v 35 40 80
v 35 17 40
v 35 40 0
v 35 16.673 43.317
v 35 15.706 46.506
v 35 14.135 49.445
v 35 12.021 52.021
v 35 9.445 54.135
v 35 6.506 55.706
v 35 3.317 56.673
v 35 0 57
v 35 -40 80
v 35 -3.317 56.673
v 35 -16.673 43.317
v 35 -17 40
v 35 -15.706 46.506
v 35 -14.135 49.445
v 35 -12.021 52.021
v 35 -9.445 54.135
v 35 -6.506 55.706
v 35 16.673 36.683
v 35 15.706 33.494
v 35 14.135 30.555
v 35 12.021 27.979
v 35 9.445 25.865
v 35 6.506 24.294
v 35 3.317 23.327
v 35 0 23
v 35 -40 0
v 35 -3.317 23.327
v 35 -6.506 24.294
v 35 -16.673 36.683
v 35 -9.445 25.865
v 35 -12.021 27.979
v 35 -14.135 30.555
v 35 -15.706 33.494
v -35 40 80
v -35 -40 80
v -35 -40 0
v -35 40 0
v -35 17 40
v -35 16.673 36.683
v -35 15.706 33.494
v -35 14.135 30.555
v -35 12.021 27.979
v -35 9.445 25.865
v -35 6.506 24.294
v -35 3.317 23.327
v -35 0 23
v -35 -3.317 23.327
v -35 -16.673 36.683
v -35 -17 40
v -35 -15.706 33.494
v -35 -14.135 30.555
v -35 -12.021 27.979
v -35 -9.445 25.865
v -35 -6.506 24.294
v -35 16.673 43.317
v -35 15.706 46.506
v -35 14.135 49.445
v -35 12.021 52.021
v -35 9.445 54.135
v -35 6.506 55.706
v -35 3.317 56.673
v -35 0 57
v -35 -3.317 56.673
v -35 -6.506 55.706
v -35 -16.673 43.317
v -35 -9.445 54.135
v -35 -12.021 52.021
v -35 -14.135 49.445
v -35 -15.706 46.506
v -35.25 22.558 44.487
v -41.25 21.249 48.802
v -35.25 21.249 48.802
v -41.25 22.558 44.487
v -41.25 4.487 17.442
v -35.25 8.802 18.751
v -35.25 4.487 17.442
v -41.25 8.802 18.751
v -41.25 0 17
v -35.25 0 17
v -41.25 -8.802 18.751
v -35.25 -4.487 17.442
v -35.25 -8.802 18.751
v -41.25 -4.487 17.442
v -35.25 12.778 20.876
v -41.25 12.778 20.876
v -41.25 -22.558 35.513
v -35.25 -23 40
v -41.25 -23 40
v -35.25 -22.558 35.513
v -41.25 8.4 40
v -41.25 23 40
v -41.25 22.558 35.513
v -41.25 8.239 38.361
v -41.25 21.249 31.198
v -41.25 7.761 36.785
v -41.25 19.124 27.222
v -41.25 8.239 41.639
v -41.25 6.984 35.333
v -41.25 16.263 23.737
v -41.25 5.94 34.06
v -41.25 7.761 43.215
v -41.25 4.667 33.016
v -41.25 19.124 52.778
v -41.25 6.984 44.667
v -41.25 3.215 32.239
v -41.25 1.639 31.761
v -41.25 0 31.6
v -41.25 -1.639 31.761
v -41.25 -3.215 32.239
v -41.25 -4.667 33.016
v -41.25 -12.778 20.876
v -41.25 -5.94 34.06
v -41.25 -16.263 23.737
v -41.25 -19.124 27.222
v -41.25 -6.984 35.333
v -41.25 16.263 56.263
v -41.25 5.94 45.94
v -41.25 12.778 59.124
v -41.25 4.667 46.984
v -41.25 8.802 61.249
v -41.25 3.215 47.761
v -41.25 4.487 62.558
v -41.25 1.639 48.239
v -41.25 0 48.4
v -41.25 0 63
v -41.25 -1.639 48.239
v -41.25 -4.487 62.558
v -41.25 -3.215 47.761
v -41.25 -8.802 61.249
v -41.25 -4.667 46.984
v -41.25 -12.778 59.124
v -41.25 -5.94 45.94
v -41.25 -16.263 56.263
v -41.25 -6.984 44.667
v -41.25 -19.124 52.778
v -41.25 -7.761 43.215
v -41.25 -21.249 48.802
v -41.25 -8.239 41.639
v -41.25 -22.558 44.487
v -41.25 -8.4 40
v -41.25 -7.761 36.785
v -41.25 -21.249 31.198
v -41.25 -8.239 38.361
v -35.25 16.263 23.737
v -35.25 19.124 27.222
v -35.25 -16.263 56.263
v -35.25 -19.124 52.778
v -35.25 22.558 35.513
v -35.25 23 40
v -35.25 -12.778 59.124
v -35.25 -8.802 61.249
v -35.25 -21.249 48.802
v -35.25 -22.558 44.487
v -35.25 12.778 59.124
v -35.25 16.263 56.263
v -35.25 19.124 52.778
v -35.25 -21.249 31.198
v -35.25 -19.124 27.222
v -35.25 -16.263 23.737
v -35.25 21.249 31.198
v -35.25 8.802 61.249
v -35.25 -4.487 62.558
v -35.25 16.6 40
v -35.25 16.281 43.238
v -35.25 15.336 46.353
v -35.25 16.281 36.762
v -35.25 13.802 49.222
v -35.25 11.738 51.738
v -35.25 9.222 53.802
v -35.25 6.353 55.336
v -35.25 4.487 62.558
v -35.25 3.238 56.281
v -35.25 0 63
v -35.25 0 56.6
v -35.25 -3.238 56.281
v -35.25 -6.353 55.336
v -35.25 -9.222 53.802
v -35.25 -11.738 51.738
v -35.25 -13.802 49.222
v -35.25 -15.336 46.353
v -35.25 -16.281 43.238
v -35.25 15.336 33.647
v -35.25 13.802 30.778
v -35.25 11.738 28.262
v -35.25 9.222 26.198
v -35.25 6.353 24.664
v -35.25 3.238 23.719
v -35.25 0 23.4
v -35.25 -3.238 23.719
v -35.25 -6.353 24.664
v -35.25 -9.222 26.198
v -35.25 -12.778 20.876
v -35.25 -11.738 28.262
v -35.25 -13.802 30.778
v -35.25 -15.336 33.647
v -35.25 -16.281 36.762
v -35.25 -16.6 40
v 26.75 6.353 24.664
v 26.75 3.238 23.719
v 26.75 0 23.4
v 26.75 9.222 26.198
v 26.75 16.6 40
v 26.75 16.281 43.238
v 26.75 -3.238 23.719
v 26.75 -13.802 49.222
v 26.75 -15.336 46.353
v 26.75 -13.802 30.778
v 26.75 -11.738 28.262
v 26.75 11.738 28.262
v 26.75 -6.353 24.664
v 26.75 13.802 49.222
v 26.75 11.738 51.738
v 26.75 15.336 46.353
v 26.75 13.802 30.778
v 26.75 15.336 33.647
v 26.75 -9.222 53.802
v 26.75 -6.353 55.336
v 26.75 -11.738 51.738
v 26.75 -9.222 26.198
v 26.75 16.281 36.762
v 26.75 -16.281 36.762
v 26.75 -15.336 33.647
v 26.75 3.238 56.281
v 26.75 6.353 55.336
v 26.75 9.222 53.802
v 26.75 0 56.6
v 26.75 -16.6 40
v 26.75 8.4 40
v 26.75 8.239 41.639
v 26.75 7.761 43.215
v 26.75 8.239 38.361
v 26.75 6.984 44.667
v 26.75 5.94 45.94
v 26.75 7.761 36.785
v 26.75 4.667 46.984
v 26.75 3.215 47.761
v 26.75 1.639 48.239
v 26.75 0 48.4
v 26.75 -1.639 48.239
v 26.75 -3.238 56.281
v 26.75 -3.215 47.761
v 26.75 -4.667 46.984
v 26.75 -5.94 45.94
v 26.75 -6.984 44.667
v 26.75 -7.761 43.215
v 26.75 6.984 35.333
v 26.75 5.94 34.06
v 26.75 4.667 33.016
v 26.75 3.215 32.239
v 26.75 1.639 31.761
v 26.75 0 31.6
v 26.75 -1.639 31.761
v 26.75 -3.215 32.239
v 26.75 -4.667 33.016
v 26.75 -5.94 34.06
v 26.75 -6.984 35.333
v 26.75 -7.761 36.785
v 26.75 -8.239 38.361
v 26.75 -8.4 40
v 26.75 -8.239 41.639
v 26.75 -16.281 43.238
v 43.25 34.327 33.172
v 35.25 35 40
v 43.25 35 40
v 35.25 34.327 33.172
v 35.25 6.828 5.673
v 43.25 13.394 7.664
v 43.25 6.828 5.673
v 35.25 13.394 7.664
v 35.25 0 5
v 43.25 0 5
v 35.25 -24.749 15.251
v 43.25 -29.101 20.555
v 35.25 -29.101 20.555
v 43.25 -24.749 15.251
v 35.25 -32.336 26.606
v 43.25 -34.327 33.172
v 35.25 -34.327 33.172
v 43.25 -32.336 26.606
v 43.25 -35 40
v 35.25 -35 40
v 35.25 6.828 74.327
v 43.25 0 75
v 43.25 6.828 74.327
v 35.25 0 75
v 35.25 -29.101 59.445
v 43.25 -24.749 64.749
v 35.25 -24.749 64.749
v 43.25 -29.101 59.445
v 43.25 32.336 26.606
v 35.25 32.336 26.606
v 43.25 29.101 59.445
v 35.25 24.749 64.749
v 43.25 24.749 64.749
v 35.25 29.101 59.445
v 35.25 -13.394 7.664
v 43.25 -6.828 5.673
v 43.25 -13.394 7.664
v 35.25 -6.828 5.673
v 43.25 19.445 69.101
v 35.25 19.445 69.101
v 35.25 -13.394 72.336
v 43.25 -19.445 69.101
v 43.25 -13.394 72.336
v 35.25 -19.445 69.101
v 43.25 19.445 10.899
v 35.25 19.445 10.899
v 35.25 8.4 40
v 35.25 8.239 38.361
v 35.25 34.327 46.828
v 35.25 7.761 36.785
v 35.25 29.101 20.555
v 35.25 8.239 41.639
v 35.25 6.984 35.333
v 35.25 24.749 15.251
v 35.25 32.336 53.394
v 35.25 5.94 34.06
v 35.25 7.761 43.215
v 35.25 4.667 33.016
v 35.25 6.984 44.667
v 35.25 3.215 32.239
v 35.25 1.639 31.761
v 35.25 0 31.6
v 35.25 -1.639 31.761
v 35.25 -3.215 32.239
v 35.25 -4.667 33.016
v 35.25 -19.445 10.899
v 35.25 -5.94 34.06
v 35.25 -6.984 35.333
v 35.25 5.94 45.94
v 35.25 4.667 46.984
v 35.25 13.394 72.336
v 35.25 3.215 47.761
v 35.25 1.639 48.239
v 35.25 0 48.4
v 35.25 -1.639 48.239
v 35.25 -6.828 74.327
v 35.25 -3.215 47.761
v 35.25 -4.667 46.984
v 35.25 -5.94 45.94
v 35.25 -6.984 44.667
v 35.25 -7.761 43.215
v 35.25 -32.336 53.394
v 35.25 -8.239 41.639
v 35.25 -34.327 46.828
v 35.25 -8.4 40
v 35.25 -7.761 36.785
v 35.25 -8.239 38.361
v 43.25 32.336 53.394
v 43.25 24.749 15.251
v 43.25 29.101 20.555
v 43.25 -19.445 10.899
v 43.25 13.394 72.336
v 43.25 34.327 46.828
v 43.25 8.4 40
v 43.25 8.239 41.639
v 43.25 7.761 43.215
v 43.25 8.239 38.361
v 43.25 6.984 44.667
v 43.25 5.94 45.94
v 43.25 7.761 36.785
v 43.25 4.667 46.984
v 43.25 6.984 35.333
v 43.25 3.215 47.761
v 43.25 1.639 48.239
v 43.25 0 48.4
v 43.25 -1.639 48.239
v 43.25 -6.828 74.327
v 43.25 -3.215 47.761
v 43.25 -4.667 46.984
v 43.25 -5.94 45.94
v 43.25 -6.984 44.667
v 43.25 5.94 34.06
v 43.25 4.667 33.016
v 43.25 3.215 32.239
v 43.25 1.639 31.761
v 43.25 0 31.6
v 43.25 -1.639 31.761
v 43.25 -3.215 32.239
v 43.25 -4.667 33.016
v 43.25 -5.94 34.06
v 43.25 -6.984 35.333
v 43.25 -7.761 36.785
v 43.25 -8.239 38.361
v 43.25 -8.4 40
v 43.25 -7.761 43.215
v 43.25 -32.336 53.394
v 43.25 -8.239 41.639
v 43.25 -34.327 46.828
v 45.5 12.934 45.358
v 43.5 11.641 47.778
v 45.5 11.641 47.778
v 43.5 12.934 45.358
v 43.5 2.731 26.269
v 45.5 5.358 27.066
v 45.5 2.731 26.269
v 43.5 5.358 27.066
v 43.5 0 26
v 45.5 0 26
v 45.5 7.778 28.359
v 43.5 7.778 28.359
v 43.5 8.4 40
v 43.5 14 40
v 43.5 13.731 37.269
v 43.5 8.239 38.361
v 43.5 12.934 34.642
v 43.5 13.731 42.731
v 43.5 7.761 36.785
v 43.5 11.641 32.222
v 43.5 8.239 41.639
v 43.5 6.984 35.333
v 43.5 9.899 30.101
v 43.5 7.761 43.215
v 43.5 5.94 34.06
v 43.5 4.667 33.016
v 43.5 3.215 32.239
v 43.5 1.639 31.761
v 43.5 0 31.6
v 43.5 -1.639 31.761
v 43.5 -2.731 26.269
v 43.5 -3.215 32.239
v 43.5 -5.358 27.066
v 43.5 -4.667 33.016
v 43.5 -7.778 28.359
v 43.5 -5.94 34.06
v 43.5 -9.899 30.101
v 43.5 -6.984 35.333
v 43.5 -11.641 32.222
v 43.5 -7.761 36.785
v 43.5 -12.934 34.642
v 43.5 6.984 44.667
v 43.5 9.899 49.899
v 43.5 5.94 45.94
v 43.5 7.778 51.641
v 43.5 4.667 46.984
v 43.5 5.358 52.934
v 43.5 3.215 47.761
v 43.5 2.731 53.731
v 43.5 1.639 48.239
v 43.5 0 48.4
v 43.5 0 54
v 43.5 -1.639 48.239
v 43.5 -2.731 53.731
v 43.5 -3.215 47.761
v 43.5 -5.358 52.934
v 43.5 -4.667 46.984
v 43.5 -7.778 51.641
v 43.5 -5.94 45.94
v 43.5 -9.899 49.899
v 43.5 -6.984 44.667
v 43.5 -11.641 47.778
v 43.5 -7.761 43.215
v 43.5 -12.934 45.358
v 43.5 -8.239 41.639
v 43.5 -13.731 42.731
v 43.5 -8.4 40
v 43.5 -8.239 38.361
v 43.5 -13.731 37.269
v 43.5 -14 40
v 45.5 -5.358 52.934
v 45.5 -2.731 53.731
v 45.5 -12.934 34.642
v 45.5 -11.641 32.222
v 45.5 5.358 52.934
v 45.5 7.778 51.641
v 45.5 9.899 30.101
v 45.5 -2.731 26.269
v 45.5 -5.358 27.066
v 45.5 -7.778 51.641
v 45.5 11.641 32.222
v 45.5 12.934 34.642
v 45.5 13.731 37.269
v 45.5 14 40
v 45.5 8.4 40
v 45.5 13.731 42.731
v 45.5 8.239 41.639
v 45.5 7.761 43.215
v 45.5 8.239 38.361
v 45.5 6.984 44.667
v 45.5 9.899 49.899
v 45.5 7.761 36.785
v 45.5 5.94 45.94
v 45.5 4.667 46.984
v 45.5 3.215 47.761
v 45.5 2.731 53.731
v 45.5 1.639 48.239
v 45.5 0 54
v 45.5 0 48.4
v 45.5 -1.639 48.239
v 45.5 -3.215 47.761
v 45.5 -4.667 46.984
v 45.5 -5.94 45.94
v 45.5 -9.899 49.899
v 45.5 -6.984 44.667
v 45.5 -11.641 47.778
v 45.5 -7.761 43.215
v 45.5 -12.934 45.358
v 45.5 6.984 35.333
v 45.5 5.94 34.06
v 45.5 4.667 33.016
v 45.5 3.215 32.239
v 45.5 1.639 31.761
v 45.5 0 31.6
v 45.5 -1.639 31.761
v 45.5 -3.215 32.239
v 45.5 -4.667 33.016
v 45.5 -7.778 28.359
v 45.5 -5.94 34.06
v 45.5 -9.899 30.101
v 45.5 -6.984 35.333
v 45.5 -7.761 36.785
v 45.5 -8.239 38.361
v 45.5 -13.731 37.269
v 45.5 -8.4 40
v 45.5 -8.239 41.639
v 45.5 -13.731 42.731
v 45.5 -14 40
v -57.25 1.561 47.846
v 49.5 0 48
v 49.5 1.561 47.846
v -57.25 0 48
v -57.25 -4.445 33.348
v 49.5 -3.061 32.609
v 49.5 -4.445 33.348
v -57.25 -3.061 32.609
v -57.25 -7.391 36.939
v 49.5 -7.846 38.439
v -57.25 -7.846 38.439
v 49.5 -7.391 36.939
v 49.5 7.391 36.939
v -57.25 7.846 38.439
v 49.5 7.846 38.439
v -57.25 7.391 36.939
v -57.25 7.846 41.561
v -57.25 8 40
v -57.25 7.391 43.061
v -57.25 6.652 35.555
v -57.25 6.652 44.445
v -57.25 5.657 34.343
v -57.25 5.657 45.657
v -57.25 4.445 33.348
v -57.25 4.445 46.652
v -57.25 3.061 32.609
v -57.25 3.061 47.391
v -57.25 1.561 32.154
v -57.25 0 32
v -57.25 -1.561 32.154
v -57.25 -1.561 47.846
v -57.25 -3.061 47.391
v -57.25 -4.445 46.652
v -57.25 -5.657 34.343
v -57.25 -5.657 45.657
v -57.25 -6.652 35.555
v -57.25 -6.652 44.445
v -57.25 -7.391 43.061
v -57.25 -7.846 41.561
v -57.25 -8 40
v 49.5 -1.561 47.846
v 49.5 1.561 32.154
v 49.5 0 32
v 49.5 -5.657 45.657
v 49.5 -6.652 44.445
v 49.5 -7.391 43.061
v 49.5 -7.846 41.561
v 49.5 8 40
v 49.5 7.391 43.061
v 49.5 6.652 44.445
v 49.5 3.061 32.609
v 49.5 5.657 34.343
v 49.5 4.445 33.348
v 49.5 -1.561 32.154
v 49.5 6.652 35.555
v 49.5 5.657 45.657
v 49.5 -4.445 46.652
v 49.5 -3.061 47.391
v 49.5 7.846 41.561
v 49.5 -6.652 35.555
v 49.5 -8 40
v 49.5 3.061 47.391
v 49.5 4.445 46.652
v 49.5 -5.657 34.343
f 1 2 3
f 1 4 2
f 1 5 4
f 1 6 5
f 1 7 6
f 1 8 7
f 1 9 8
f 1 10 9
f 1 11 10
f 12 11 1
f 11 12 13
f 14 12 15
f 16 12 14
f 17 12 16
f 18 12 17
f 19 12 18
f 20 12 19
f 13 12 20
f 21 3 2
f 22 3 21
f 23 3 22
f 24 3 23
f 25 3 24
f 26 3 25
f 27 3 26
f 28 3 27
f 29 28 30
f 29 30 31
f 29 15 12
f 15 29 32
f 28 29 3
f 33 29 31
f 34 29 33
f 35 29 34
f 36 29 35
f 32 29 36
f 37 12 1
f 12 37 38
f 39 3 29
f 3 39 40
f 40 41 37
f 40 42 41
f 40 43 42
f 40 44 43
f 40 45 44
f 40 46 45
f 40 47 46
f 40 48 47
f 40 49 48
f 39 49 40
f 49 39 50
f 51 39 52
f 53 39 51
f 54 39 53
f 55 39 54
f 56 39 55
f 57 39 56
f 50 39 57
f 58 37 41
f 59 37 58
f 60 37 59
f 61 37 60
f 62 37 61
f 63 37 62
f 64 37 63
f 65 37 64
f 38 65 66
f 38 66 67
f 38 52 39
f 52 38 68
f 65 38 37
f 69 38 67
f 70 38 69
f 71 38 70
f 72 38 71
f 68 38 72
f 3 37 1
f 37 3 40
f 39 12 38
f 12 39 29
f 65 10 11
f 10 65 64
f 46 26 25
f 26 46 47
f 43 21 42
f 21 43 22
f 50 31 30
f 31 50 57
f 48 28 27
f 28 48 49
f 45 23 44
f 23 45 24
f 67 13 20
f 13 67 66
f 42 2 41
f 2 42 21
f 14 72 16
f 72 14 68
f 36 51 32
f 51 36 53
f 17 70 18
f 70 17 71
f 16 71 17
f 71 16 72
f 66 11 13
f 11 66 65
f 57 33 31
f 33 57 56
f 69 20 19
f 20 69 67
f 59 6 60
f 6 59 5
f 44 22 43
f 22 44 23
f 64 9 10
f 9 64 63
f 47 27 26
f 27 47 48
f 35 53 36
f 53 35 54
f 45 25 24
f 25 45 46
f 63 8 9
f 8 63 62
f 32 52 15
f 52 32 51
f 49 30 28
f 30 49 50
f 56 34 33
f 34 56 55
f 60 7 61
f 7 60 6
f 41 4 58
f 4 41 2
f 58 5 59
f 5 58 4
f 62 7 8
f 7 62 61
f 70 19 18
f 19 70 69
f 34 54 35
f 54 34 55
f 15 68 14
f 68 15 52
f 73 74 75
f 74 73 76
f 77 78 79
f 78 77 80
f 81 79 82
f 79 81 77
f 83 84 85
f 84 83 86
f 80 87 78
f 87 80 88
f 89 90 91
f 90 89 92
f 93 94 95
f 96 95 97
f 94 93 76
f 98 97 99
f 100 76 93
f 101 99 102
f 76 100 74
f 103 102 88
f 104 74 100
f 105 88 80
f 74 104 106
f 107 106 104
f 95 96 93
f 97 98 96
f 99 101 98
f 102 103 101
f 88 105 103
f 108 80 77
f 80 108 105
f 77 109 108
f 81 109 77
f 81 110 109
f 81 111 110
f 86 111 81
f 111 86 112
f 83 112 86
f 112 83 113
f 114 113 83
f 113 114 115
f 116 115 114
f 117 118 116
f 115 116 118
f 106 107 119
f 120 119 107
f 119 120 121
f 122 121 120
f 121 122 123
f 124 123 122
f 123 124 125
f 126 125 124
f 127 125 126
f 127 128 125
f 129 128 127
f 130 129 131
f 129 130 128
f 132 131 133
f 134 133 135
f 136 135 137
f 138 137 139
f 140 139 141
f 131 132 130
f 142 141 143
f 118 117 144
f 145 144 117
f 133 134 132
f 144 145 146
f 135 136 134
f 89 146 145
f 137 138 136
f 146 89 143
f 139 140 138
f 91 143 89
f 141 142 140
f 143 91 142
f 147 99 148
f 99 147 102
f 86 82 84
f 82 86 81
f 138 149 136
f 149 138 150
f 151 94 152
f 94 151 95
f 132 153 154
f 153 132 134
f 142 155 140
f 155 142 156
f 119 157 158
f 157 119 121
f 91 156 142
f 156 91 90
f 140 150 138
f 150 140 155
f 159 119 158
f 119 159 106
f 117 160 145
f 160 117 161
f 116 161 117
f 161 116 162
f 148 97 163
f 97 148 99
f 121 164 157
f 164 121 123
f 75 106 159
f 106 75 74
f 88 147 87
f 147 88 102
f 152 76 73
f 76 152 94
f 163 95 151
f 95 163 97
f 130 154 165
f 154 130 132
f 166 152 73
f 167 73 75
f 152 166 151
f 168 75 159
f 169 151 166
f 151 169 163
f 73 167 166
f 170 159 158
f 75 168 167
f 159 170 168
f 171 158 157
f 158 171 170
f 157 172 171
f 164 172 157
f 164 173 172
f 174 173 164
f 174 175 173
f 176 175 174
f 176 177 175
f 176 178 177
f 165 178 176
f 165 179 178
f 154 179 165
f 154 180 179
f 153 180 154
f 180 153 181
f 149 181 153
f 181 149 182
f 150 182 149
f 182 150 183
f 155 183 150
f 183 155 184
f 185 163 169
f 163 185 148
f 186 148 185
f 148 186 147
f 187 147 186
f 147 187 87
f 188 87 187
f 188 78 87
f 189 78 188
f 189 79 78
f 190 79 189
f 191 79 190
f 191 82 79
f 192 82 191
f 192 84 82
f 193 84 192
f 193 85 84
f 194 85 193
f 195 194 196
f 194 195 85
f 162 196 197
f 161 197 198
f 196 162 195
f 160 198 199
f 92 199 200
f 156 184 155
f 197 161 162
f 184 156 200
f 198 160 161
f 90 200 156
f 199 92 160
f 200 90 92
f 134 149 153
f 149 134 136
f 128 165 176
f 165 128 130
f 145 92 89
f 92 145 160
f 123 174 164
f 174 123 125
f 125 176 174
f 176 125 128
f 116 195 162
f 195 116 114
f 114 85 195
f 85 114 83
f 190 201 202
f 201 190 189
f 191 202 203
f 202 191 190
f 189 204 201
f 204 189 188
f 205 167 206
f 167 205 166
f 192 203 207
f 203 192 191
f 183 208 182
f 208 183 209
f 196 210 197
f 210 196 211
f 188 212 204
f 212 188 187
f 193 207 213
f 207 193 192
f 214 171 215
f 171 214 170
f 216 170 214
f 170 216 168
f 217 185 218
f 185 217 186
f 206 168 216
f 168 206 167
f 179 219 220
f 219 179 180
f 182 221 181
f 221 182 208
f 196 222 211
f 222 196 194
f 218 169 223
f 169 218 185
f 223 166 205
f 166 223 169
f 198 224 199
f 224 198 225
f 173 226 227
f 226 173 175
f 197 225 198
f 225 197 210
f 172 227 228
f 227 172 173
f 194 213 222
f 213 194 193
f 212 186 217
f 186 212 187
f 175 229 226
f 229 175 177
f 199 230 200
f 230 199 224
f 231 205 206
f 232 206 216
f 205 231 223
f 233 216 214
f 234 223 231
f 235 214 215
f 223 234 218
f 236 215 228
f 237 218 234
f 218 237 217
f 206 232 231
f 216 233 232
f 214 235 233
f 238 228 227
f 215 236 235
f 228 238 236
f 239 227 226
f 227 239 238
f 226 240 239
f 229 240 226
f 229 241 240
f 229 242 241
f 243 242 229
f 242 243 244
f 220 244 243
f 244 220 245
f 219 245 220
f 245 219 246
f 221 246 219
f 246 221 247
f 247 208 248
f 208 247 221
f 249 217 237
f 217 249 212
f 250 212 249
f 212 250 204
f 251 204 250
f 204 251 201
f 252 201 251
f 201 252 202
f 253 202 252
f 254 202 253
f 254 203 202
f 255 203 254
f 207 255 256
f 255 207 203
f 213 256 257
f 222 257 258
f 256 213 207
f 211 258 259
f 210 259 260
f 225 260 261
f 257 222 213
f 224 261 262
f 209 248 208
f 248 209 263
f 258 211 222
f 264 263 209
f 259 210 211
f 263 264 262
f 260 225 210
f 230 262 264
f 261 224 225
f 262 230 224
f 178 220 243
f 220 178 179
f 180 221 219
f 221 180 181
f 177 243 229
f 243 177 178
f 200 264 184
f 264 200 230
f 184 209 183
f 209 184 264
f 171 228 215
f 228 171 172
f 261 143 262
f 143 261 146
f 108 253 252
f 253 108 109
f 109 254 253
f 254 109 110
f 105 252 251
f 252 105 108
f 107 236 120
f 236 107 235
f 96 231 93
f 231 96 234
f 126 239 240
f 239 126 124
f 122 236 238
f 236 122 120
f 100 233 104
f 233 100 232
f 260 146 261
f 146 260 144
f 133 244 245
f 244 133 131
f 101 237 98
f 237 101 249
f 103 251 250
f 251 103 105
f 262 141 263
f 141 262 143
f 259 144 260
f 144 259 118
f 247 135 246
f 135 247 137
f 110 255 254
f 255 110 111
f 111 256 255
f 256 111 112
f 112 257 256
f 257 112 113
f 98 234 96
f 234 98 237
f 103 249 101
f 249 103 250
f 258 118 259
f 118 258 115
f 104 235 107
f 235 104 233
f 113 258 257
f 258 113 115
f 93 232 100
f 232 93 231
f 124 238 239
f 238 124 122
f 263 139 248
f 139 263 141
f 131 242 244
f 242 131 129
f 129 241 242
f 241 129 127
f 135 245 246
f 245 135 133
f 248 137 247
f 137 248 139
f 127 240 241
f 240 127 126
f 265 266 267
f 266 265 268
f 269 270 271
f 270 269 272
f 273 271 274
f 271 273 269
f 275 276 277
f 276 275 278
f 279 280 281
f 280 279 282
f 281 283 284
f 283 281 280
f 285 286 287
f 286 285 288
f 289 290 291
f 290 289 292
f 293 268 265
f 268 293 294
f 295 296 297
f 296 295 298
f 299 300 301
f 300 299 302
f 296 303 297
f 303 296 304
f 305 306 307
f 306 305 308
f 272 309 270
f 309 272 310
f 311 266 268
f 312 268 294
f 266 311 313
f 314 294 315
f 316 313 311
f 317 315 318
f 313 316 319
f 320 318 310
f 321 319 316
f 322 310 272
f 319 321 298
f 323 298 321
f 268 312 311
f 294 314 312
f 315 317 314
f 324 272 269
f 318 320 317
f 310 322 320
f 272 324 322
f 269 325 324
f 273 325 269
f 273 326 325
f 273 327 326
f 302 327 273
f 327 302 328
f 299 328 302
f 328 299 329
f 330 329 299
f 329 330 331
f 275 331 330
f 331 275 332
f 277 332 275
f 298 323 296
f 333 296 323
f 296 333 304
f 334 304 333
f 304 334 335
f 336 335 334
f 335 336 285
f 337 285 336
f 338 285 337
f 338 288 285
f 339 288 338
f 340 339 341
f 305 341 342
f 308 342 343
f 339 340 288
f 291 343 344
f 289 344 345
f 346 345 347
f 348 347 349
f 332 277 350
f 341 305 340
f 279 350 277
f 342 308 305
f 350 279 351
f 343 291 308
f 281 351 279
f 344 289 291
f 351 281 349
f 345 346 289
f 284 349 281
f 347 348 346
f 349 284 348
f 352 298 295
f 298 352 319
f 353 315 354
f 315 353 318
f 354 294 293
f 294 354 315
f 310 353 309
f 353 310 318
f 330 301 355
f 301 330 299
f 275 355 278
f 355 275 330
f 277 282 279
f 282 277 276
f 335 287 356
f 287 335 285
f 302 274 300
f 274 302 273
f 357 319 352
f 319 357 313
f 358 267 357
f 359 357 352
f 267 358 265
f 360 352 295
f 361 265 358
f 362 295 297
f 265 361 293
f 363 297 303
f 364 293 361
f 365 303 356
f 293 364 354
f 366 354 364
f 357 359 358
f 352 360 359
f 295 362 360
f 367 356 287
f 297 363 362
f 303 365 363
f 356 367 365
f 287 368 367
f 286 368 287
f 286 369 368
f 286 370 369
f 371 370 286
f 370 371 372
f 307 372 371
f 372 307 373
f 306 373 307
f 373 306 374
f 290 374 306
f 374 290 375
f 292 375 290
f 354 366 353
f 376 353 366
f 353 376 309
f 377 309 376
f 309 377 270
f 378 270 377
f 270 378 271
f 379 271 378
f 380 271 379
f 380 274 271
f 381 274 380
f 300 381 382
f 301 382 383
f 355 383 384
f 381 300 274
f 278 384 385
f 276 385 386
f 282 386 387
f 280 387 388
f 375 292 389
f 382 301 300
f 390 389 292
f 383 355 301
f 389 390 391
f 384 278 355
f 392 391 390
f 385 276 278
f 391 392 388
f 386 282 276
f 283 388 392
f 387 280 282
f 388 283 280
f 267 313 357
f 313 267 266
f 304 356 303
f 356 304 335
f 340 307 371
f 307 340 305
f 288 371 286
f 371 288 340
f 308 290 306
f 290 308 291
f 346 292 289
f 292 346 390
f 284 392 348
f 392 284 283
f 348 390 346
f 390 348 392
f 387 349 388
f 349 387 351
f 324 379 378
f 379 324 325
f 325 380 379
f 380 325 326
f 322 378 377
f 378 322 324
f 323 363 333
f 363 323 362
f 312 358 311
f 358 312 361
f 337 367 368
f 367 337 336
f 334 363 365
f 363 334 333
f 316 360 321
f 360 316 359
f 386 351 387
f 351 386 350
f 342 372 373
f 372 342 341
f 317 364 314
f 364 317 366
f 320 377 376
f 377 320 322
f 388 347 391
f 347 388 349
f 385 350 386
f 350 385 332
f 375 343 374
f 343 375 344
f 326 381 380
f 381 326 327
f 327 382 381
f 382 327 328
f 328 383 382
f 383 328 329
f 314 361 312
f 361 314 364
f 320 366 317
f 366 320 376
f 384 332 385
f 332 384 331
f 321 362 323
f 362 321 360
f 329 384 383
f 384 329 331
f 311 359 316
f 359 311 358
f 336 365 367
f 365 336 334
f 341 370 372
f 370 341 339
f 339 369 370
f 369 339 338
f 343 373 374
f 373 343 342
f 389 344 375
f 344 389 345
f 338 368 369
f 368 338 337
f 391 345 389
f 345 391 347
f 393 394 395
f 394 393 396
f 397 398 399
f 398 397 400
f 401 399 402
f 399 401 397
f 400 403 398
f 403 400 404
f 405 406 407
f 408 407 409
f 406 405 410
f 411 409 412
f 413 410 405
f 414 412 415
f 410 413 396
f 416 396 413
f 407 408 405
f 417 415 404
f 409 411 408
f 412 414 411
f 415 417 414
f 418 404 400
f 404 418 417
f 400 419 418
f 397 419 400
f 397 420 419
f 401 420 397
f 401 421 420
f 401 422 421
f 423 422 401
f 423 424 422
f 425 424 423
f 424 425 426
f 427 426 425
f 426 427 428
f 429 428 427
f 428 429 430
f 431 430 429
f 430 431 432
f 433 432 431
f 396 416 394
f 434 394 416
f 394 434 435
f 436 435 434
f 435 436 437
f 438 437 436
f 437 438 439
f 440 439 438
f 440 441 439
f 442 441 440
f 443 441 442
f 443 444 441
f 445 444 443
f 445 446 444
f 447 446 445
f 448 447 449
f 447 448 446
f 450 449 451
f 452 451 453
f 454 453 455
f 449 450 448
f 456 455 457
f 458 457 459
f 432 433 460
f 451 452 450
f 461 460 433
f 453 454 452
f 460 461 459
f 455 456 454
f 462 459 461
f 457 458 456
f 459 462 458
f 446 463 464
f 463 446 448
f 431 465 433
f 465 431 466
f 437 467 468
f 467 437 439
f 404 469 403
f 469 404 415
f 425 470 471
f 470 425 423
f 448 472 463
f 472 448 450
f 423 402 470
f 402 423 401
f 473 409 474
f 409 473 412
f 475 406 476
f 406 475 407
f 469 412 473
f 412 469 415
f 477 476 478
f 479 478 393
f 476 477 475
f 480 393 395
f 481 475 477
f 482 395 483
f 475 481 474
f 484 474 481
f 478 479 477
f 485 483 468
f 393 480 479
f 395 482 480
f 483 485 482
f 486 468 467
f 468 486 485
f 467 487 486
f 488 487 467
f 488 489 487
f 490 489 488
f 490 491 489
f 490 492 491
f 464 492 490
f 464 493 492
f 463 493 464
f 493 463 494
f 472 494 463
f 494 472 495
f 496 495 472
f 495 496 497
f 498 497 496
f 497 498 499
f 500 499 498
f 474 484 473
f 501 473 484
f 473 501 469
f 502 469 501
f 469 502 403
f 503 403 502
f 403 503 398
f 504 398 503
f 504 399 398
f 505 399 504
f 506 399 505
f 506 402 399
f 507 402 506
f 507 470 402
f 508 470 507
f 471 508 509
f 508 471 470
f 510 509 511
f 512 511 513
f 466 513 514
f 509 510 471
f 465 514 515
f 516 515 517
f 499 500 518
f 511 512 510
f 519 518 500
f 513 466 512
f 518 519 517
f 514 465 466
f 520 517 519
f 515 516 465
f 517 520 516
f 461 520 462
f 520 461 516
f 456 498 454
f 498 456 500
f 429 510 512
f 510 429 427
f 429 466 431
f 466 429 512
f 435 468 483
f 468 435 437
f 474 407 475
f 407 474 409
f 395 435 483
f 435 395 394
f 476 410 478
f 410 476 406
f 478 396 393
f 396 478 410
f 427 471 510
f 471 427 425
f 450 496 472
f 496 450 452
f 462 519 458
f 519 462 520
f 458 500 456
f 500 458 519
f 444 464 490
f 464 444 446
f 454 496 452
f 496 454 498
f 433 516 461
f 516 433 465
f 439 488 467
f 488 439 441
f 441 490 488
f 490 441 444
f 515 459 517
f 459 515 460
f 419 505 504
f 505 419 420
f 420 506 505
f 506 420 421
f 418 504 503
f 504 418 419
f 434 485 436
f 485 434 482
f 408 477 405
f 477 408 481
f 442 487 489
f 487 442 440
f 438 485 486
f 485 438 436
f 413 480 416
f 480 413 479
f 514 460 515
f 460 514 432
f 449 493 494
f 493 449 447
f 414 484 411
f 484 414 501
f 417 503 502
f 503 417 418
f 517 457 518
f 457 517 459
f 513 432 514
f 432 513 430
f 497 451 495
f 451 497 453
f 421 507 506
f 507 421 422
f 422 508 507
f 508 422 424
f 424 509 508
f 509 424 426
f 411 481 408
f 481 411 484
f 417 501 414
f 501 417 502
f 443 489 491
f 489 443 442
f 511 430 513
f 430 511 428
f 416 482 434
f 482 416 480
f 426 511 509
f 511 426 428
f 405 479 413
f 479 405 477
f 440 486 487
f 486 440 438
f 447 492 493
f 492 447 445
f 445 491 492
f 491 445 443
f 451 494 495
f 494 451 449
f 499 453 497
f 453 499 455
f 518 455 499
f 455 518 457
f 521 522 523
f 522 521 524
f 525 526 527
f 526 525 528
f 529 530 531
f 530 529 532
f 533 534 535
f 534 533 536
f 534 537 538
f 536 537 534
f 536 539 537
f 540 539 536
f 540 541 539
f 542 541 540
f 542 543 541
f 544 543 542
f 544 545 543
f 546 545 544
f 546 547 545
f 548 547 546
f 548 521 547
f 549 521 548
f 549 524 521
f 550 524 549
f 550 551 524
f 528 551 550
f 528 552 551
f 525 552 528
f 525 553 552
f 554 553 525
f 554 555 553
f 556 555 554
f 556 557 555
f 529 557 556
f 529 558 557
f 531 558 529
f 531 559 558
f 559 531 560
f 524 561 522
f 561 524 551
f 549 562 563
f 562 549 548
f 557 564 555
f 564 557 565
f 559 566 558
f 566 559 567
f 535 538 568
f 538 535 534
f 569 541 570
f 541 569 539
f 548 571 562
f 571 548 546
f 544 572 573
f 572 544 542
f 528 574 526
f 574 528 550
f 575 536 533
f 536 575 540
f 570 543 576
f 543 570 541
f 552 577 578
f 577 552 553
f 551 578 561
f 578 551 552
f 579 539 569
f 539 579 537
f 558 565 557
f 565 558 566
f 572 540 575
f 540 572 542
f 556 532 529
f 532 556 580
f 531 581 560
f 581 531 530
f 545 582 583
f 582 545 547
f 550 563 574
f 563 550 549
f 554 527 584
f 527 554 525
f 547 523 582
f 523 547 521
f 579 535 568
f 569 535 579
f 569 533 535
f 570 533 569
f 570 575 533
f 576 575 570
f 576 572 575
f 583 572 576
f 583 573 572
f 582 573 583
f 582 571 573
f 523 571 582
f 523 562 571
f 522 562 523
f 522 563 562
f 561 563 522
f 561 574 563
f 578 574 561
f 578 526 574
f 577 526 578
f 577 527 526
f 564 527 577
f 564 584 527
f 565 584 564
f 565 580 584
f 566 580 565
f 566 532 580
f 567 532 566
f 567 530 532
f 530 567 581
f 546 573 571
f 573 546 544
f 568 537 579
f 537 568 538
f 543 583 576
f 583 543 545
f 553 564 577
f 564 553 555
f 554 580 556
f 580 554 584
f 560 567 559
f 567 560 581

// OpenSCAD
$fn = 32;

// ------------------------------------------------------------------------
// Bushed housing: 70 x 80 x 80 mm housing, bushing d33.2
// Every part is its own module, assembly() places them once.
// ------------------------------------------------------------------------

// --- part 1 ---
module housing() {
  difference() {
    translate([-35, -40, 0]) cube([70, 80, 80]);
    translate([0, 0, 40]) rotate([0, 90, 0]) cylinder(h = 72, d = 34, center = true);
  }
}

// --- part 2 ---
module bushing() {
  difference() {
    union() {
      cylinder(h = 6, d = 46);
      translate([0, 0, 6]) cylinder(h = 62, d = 33.2);
    }
    translate([0, 0, -1]) cylinder(h = 70, d = 16.8);
  }
}

// --- part 3 ---
module shaft() {
  translate([0, 0, -53.375]) cylinder(h = 106.75, d = 16);
}

// --- part 4 ---
module cover() {
  difference() {
    cylinder(h = 8, d = 70);
    translate([0, 0, -1]) cylinder(h = 10, d = 16.8);
  }
}

// --- part 5 ---
module washer() {
  difference() {
      translate([0, 0, 0]) cylinder(h = 2, d = 28);
      translate([0, 0, -1]) cylinder(h = 4, d = 16.8);
    }
}

// --- assembly ---
module assembly() {
  translate([0, 0, 0]) rotate([0, 0, 0]) housing();
  translate([-41.25, 0, 40]) rotate([0, 90, 0]) bushing();
  translate([-3.875, 0, 40]) rotate([0, 90, 0]) shaft();
  translate([35.25, 0, 40]) rotate([0, 90, 0]) cover();
  translate([43.5, 0, 40]) rotate([0, 90, 0]) washer();
}

assembly();
